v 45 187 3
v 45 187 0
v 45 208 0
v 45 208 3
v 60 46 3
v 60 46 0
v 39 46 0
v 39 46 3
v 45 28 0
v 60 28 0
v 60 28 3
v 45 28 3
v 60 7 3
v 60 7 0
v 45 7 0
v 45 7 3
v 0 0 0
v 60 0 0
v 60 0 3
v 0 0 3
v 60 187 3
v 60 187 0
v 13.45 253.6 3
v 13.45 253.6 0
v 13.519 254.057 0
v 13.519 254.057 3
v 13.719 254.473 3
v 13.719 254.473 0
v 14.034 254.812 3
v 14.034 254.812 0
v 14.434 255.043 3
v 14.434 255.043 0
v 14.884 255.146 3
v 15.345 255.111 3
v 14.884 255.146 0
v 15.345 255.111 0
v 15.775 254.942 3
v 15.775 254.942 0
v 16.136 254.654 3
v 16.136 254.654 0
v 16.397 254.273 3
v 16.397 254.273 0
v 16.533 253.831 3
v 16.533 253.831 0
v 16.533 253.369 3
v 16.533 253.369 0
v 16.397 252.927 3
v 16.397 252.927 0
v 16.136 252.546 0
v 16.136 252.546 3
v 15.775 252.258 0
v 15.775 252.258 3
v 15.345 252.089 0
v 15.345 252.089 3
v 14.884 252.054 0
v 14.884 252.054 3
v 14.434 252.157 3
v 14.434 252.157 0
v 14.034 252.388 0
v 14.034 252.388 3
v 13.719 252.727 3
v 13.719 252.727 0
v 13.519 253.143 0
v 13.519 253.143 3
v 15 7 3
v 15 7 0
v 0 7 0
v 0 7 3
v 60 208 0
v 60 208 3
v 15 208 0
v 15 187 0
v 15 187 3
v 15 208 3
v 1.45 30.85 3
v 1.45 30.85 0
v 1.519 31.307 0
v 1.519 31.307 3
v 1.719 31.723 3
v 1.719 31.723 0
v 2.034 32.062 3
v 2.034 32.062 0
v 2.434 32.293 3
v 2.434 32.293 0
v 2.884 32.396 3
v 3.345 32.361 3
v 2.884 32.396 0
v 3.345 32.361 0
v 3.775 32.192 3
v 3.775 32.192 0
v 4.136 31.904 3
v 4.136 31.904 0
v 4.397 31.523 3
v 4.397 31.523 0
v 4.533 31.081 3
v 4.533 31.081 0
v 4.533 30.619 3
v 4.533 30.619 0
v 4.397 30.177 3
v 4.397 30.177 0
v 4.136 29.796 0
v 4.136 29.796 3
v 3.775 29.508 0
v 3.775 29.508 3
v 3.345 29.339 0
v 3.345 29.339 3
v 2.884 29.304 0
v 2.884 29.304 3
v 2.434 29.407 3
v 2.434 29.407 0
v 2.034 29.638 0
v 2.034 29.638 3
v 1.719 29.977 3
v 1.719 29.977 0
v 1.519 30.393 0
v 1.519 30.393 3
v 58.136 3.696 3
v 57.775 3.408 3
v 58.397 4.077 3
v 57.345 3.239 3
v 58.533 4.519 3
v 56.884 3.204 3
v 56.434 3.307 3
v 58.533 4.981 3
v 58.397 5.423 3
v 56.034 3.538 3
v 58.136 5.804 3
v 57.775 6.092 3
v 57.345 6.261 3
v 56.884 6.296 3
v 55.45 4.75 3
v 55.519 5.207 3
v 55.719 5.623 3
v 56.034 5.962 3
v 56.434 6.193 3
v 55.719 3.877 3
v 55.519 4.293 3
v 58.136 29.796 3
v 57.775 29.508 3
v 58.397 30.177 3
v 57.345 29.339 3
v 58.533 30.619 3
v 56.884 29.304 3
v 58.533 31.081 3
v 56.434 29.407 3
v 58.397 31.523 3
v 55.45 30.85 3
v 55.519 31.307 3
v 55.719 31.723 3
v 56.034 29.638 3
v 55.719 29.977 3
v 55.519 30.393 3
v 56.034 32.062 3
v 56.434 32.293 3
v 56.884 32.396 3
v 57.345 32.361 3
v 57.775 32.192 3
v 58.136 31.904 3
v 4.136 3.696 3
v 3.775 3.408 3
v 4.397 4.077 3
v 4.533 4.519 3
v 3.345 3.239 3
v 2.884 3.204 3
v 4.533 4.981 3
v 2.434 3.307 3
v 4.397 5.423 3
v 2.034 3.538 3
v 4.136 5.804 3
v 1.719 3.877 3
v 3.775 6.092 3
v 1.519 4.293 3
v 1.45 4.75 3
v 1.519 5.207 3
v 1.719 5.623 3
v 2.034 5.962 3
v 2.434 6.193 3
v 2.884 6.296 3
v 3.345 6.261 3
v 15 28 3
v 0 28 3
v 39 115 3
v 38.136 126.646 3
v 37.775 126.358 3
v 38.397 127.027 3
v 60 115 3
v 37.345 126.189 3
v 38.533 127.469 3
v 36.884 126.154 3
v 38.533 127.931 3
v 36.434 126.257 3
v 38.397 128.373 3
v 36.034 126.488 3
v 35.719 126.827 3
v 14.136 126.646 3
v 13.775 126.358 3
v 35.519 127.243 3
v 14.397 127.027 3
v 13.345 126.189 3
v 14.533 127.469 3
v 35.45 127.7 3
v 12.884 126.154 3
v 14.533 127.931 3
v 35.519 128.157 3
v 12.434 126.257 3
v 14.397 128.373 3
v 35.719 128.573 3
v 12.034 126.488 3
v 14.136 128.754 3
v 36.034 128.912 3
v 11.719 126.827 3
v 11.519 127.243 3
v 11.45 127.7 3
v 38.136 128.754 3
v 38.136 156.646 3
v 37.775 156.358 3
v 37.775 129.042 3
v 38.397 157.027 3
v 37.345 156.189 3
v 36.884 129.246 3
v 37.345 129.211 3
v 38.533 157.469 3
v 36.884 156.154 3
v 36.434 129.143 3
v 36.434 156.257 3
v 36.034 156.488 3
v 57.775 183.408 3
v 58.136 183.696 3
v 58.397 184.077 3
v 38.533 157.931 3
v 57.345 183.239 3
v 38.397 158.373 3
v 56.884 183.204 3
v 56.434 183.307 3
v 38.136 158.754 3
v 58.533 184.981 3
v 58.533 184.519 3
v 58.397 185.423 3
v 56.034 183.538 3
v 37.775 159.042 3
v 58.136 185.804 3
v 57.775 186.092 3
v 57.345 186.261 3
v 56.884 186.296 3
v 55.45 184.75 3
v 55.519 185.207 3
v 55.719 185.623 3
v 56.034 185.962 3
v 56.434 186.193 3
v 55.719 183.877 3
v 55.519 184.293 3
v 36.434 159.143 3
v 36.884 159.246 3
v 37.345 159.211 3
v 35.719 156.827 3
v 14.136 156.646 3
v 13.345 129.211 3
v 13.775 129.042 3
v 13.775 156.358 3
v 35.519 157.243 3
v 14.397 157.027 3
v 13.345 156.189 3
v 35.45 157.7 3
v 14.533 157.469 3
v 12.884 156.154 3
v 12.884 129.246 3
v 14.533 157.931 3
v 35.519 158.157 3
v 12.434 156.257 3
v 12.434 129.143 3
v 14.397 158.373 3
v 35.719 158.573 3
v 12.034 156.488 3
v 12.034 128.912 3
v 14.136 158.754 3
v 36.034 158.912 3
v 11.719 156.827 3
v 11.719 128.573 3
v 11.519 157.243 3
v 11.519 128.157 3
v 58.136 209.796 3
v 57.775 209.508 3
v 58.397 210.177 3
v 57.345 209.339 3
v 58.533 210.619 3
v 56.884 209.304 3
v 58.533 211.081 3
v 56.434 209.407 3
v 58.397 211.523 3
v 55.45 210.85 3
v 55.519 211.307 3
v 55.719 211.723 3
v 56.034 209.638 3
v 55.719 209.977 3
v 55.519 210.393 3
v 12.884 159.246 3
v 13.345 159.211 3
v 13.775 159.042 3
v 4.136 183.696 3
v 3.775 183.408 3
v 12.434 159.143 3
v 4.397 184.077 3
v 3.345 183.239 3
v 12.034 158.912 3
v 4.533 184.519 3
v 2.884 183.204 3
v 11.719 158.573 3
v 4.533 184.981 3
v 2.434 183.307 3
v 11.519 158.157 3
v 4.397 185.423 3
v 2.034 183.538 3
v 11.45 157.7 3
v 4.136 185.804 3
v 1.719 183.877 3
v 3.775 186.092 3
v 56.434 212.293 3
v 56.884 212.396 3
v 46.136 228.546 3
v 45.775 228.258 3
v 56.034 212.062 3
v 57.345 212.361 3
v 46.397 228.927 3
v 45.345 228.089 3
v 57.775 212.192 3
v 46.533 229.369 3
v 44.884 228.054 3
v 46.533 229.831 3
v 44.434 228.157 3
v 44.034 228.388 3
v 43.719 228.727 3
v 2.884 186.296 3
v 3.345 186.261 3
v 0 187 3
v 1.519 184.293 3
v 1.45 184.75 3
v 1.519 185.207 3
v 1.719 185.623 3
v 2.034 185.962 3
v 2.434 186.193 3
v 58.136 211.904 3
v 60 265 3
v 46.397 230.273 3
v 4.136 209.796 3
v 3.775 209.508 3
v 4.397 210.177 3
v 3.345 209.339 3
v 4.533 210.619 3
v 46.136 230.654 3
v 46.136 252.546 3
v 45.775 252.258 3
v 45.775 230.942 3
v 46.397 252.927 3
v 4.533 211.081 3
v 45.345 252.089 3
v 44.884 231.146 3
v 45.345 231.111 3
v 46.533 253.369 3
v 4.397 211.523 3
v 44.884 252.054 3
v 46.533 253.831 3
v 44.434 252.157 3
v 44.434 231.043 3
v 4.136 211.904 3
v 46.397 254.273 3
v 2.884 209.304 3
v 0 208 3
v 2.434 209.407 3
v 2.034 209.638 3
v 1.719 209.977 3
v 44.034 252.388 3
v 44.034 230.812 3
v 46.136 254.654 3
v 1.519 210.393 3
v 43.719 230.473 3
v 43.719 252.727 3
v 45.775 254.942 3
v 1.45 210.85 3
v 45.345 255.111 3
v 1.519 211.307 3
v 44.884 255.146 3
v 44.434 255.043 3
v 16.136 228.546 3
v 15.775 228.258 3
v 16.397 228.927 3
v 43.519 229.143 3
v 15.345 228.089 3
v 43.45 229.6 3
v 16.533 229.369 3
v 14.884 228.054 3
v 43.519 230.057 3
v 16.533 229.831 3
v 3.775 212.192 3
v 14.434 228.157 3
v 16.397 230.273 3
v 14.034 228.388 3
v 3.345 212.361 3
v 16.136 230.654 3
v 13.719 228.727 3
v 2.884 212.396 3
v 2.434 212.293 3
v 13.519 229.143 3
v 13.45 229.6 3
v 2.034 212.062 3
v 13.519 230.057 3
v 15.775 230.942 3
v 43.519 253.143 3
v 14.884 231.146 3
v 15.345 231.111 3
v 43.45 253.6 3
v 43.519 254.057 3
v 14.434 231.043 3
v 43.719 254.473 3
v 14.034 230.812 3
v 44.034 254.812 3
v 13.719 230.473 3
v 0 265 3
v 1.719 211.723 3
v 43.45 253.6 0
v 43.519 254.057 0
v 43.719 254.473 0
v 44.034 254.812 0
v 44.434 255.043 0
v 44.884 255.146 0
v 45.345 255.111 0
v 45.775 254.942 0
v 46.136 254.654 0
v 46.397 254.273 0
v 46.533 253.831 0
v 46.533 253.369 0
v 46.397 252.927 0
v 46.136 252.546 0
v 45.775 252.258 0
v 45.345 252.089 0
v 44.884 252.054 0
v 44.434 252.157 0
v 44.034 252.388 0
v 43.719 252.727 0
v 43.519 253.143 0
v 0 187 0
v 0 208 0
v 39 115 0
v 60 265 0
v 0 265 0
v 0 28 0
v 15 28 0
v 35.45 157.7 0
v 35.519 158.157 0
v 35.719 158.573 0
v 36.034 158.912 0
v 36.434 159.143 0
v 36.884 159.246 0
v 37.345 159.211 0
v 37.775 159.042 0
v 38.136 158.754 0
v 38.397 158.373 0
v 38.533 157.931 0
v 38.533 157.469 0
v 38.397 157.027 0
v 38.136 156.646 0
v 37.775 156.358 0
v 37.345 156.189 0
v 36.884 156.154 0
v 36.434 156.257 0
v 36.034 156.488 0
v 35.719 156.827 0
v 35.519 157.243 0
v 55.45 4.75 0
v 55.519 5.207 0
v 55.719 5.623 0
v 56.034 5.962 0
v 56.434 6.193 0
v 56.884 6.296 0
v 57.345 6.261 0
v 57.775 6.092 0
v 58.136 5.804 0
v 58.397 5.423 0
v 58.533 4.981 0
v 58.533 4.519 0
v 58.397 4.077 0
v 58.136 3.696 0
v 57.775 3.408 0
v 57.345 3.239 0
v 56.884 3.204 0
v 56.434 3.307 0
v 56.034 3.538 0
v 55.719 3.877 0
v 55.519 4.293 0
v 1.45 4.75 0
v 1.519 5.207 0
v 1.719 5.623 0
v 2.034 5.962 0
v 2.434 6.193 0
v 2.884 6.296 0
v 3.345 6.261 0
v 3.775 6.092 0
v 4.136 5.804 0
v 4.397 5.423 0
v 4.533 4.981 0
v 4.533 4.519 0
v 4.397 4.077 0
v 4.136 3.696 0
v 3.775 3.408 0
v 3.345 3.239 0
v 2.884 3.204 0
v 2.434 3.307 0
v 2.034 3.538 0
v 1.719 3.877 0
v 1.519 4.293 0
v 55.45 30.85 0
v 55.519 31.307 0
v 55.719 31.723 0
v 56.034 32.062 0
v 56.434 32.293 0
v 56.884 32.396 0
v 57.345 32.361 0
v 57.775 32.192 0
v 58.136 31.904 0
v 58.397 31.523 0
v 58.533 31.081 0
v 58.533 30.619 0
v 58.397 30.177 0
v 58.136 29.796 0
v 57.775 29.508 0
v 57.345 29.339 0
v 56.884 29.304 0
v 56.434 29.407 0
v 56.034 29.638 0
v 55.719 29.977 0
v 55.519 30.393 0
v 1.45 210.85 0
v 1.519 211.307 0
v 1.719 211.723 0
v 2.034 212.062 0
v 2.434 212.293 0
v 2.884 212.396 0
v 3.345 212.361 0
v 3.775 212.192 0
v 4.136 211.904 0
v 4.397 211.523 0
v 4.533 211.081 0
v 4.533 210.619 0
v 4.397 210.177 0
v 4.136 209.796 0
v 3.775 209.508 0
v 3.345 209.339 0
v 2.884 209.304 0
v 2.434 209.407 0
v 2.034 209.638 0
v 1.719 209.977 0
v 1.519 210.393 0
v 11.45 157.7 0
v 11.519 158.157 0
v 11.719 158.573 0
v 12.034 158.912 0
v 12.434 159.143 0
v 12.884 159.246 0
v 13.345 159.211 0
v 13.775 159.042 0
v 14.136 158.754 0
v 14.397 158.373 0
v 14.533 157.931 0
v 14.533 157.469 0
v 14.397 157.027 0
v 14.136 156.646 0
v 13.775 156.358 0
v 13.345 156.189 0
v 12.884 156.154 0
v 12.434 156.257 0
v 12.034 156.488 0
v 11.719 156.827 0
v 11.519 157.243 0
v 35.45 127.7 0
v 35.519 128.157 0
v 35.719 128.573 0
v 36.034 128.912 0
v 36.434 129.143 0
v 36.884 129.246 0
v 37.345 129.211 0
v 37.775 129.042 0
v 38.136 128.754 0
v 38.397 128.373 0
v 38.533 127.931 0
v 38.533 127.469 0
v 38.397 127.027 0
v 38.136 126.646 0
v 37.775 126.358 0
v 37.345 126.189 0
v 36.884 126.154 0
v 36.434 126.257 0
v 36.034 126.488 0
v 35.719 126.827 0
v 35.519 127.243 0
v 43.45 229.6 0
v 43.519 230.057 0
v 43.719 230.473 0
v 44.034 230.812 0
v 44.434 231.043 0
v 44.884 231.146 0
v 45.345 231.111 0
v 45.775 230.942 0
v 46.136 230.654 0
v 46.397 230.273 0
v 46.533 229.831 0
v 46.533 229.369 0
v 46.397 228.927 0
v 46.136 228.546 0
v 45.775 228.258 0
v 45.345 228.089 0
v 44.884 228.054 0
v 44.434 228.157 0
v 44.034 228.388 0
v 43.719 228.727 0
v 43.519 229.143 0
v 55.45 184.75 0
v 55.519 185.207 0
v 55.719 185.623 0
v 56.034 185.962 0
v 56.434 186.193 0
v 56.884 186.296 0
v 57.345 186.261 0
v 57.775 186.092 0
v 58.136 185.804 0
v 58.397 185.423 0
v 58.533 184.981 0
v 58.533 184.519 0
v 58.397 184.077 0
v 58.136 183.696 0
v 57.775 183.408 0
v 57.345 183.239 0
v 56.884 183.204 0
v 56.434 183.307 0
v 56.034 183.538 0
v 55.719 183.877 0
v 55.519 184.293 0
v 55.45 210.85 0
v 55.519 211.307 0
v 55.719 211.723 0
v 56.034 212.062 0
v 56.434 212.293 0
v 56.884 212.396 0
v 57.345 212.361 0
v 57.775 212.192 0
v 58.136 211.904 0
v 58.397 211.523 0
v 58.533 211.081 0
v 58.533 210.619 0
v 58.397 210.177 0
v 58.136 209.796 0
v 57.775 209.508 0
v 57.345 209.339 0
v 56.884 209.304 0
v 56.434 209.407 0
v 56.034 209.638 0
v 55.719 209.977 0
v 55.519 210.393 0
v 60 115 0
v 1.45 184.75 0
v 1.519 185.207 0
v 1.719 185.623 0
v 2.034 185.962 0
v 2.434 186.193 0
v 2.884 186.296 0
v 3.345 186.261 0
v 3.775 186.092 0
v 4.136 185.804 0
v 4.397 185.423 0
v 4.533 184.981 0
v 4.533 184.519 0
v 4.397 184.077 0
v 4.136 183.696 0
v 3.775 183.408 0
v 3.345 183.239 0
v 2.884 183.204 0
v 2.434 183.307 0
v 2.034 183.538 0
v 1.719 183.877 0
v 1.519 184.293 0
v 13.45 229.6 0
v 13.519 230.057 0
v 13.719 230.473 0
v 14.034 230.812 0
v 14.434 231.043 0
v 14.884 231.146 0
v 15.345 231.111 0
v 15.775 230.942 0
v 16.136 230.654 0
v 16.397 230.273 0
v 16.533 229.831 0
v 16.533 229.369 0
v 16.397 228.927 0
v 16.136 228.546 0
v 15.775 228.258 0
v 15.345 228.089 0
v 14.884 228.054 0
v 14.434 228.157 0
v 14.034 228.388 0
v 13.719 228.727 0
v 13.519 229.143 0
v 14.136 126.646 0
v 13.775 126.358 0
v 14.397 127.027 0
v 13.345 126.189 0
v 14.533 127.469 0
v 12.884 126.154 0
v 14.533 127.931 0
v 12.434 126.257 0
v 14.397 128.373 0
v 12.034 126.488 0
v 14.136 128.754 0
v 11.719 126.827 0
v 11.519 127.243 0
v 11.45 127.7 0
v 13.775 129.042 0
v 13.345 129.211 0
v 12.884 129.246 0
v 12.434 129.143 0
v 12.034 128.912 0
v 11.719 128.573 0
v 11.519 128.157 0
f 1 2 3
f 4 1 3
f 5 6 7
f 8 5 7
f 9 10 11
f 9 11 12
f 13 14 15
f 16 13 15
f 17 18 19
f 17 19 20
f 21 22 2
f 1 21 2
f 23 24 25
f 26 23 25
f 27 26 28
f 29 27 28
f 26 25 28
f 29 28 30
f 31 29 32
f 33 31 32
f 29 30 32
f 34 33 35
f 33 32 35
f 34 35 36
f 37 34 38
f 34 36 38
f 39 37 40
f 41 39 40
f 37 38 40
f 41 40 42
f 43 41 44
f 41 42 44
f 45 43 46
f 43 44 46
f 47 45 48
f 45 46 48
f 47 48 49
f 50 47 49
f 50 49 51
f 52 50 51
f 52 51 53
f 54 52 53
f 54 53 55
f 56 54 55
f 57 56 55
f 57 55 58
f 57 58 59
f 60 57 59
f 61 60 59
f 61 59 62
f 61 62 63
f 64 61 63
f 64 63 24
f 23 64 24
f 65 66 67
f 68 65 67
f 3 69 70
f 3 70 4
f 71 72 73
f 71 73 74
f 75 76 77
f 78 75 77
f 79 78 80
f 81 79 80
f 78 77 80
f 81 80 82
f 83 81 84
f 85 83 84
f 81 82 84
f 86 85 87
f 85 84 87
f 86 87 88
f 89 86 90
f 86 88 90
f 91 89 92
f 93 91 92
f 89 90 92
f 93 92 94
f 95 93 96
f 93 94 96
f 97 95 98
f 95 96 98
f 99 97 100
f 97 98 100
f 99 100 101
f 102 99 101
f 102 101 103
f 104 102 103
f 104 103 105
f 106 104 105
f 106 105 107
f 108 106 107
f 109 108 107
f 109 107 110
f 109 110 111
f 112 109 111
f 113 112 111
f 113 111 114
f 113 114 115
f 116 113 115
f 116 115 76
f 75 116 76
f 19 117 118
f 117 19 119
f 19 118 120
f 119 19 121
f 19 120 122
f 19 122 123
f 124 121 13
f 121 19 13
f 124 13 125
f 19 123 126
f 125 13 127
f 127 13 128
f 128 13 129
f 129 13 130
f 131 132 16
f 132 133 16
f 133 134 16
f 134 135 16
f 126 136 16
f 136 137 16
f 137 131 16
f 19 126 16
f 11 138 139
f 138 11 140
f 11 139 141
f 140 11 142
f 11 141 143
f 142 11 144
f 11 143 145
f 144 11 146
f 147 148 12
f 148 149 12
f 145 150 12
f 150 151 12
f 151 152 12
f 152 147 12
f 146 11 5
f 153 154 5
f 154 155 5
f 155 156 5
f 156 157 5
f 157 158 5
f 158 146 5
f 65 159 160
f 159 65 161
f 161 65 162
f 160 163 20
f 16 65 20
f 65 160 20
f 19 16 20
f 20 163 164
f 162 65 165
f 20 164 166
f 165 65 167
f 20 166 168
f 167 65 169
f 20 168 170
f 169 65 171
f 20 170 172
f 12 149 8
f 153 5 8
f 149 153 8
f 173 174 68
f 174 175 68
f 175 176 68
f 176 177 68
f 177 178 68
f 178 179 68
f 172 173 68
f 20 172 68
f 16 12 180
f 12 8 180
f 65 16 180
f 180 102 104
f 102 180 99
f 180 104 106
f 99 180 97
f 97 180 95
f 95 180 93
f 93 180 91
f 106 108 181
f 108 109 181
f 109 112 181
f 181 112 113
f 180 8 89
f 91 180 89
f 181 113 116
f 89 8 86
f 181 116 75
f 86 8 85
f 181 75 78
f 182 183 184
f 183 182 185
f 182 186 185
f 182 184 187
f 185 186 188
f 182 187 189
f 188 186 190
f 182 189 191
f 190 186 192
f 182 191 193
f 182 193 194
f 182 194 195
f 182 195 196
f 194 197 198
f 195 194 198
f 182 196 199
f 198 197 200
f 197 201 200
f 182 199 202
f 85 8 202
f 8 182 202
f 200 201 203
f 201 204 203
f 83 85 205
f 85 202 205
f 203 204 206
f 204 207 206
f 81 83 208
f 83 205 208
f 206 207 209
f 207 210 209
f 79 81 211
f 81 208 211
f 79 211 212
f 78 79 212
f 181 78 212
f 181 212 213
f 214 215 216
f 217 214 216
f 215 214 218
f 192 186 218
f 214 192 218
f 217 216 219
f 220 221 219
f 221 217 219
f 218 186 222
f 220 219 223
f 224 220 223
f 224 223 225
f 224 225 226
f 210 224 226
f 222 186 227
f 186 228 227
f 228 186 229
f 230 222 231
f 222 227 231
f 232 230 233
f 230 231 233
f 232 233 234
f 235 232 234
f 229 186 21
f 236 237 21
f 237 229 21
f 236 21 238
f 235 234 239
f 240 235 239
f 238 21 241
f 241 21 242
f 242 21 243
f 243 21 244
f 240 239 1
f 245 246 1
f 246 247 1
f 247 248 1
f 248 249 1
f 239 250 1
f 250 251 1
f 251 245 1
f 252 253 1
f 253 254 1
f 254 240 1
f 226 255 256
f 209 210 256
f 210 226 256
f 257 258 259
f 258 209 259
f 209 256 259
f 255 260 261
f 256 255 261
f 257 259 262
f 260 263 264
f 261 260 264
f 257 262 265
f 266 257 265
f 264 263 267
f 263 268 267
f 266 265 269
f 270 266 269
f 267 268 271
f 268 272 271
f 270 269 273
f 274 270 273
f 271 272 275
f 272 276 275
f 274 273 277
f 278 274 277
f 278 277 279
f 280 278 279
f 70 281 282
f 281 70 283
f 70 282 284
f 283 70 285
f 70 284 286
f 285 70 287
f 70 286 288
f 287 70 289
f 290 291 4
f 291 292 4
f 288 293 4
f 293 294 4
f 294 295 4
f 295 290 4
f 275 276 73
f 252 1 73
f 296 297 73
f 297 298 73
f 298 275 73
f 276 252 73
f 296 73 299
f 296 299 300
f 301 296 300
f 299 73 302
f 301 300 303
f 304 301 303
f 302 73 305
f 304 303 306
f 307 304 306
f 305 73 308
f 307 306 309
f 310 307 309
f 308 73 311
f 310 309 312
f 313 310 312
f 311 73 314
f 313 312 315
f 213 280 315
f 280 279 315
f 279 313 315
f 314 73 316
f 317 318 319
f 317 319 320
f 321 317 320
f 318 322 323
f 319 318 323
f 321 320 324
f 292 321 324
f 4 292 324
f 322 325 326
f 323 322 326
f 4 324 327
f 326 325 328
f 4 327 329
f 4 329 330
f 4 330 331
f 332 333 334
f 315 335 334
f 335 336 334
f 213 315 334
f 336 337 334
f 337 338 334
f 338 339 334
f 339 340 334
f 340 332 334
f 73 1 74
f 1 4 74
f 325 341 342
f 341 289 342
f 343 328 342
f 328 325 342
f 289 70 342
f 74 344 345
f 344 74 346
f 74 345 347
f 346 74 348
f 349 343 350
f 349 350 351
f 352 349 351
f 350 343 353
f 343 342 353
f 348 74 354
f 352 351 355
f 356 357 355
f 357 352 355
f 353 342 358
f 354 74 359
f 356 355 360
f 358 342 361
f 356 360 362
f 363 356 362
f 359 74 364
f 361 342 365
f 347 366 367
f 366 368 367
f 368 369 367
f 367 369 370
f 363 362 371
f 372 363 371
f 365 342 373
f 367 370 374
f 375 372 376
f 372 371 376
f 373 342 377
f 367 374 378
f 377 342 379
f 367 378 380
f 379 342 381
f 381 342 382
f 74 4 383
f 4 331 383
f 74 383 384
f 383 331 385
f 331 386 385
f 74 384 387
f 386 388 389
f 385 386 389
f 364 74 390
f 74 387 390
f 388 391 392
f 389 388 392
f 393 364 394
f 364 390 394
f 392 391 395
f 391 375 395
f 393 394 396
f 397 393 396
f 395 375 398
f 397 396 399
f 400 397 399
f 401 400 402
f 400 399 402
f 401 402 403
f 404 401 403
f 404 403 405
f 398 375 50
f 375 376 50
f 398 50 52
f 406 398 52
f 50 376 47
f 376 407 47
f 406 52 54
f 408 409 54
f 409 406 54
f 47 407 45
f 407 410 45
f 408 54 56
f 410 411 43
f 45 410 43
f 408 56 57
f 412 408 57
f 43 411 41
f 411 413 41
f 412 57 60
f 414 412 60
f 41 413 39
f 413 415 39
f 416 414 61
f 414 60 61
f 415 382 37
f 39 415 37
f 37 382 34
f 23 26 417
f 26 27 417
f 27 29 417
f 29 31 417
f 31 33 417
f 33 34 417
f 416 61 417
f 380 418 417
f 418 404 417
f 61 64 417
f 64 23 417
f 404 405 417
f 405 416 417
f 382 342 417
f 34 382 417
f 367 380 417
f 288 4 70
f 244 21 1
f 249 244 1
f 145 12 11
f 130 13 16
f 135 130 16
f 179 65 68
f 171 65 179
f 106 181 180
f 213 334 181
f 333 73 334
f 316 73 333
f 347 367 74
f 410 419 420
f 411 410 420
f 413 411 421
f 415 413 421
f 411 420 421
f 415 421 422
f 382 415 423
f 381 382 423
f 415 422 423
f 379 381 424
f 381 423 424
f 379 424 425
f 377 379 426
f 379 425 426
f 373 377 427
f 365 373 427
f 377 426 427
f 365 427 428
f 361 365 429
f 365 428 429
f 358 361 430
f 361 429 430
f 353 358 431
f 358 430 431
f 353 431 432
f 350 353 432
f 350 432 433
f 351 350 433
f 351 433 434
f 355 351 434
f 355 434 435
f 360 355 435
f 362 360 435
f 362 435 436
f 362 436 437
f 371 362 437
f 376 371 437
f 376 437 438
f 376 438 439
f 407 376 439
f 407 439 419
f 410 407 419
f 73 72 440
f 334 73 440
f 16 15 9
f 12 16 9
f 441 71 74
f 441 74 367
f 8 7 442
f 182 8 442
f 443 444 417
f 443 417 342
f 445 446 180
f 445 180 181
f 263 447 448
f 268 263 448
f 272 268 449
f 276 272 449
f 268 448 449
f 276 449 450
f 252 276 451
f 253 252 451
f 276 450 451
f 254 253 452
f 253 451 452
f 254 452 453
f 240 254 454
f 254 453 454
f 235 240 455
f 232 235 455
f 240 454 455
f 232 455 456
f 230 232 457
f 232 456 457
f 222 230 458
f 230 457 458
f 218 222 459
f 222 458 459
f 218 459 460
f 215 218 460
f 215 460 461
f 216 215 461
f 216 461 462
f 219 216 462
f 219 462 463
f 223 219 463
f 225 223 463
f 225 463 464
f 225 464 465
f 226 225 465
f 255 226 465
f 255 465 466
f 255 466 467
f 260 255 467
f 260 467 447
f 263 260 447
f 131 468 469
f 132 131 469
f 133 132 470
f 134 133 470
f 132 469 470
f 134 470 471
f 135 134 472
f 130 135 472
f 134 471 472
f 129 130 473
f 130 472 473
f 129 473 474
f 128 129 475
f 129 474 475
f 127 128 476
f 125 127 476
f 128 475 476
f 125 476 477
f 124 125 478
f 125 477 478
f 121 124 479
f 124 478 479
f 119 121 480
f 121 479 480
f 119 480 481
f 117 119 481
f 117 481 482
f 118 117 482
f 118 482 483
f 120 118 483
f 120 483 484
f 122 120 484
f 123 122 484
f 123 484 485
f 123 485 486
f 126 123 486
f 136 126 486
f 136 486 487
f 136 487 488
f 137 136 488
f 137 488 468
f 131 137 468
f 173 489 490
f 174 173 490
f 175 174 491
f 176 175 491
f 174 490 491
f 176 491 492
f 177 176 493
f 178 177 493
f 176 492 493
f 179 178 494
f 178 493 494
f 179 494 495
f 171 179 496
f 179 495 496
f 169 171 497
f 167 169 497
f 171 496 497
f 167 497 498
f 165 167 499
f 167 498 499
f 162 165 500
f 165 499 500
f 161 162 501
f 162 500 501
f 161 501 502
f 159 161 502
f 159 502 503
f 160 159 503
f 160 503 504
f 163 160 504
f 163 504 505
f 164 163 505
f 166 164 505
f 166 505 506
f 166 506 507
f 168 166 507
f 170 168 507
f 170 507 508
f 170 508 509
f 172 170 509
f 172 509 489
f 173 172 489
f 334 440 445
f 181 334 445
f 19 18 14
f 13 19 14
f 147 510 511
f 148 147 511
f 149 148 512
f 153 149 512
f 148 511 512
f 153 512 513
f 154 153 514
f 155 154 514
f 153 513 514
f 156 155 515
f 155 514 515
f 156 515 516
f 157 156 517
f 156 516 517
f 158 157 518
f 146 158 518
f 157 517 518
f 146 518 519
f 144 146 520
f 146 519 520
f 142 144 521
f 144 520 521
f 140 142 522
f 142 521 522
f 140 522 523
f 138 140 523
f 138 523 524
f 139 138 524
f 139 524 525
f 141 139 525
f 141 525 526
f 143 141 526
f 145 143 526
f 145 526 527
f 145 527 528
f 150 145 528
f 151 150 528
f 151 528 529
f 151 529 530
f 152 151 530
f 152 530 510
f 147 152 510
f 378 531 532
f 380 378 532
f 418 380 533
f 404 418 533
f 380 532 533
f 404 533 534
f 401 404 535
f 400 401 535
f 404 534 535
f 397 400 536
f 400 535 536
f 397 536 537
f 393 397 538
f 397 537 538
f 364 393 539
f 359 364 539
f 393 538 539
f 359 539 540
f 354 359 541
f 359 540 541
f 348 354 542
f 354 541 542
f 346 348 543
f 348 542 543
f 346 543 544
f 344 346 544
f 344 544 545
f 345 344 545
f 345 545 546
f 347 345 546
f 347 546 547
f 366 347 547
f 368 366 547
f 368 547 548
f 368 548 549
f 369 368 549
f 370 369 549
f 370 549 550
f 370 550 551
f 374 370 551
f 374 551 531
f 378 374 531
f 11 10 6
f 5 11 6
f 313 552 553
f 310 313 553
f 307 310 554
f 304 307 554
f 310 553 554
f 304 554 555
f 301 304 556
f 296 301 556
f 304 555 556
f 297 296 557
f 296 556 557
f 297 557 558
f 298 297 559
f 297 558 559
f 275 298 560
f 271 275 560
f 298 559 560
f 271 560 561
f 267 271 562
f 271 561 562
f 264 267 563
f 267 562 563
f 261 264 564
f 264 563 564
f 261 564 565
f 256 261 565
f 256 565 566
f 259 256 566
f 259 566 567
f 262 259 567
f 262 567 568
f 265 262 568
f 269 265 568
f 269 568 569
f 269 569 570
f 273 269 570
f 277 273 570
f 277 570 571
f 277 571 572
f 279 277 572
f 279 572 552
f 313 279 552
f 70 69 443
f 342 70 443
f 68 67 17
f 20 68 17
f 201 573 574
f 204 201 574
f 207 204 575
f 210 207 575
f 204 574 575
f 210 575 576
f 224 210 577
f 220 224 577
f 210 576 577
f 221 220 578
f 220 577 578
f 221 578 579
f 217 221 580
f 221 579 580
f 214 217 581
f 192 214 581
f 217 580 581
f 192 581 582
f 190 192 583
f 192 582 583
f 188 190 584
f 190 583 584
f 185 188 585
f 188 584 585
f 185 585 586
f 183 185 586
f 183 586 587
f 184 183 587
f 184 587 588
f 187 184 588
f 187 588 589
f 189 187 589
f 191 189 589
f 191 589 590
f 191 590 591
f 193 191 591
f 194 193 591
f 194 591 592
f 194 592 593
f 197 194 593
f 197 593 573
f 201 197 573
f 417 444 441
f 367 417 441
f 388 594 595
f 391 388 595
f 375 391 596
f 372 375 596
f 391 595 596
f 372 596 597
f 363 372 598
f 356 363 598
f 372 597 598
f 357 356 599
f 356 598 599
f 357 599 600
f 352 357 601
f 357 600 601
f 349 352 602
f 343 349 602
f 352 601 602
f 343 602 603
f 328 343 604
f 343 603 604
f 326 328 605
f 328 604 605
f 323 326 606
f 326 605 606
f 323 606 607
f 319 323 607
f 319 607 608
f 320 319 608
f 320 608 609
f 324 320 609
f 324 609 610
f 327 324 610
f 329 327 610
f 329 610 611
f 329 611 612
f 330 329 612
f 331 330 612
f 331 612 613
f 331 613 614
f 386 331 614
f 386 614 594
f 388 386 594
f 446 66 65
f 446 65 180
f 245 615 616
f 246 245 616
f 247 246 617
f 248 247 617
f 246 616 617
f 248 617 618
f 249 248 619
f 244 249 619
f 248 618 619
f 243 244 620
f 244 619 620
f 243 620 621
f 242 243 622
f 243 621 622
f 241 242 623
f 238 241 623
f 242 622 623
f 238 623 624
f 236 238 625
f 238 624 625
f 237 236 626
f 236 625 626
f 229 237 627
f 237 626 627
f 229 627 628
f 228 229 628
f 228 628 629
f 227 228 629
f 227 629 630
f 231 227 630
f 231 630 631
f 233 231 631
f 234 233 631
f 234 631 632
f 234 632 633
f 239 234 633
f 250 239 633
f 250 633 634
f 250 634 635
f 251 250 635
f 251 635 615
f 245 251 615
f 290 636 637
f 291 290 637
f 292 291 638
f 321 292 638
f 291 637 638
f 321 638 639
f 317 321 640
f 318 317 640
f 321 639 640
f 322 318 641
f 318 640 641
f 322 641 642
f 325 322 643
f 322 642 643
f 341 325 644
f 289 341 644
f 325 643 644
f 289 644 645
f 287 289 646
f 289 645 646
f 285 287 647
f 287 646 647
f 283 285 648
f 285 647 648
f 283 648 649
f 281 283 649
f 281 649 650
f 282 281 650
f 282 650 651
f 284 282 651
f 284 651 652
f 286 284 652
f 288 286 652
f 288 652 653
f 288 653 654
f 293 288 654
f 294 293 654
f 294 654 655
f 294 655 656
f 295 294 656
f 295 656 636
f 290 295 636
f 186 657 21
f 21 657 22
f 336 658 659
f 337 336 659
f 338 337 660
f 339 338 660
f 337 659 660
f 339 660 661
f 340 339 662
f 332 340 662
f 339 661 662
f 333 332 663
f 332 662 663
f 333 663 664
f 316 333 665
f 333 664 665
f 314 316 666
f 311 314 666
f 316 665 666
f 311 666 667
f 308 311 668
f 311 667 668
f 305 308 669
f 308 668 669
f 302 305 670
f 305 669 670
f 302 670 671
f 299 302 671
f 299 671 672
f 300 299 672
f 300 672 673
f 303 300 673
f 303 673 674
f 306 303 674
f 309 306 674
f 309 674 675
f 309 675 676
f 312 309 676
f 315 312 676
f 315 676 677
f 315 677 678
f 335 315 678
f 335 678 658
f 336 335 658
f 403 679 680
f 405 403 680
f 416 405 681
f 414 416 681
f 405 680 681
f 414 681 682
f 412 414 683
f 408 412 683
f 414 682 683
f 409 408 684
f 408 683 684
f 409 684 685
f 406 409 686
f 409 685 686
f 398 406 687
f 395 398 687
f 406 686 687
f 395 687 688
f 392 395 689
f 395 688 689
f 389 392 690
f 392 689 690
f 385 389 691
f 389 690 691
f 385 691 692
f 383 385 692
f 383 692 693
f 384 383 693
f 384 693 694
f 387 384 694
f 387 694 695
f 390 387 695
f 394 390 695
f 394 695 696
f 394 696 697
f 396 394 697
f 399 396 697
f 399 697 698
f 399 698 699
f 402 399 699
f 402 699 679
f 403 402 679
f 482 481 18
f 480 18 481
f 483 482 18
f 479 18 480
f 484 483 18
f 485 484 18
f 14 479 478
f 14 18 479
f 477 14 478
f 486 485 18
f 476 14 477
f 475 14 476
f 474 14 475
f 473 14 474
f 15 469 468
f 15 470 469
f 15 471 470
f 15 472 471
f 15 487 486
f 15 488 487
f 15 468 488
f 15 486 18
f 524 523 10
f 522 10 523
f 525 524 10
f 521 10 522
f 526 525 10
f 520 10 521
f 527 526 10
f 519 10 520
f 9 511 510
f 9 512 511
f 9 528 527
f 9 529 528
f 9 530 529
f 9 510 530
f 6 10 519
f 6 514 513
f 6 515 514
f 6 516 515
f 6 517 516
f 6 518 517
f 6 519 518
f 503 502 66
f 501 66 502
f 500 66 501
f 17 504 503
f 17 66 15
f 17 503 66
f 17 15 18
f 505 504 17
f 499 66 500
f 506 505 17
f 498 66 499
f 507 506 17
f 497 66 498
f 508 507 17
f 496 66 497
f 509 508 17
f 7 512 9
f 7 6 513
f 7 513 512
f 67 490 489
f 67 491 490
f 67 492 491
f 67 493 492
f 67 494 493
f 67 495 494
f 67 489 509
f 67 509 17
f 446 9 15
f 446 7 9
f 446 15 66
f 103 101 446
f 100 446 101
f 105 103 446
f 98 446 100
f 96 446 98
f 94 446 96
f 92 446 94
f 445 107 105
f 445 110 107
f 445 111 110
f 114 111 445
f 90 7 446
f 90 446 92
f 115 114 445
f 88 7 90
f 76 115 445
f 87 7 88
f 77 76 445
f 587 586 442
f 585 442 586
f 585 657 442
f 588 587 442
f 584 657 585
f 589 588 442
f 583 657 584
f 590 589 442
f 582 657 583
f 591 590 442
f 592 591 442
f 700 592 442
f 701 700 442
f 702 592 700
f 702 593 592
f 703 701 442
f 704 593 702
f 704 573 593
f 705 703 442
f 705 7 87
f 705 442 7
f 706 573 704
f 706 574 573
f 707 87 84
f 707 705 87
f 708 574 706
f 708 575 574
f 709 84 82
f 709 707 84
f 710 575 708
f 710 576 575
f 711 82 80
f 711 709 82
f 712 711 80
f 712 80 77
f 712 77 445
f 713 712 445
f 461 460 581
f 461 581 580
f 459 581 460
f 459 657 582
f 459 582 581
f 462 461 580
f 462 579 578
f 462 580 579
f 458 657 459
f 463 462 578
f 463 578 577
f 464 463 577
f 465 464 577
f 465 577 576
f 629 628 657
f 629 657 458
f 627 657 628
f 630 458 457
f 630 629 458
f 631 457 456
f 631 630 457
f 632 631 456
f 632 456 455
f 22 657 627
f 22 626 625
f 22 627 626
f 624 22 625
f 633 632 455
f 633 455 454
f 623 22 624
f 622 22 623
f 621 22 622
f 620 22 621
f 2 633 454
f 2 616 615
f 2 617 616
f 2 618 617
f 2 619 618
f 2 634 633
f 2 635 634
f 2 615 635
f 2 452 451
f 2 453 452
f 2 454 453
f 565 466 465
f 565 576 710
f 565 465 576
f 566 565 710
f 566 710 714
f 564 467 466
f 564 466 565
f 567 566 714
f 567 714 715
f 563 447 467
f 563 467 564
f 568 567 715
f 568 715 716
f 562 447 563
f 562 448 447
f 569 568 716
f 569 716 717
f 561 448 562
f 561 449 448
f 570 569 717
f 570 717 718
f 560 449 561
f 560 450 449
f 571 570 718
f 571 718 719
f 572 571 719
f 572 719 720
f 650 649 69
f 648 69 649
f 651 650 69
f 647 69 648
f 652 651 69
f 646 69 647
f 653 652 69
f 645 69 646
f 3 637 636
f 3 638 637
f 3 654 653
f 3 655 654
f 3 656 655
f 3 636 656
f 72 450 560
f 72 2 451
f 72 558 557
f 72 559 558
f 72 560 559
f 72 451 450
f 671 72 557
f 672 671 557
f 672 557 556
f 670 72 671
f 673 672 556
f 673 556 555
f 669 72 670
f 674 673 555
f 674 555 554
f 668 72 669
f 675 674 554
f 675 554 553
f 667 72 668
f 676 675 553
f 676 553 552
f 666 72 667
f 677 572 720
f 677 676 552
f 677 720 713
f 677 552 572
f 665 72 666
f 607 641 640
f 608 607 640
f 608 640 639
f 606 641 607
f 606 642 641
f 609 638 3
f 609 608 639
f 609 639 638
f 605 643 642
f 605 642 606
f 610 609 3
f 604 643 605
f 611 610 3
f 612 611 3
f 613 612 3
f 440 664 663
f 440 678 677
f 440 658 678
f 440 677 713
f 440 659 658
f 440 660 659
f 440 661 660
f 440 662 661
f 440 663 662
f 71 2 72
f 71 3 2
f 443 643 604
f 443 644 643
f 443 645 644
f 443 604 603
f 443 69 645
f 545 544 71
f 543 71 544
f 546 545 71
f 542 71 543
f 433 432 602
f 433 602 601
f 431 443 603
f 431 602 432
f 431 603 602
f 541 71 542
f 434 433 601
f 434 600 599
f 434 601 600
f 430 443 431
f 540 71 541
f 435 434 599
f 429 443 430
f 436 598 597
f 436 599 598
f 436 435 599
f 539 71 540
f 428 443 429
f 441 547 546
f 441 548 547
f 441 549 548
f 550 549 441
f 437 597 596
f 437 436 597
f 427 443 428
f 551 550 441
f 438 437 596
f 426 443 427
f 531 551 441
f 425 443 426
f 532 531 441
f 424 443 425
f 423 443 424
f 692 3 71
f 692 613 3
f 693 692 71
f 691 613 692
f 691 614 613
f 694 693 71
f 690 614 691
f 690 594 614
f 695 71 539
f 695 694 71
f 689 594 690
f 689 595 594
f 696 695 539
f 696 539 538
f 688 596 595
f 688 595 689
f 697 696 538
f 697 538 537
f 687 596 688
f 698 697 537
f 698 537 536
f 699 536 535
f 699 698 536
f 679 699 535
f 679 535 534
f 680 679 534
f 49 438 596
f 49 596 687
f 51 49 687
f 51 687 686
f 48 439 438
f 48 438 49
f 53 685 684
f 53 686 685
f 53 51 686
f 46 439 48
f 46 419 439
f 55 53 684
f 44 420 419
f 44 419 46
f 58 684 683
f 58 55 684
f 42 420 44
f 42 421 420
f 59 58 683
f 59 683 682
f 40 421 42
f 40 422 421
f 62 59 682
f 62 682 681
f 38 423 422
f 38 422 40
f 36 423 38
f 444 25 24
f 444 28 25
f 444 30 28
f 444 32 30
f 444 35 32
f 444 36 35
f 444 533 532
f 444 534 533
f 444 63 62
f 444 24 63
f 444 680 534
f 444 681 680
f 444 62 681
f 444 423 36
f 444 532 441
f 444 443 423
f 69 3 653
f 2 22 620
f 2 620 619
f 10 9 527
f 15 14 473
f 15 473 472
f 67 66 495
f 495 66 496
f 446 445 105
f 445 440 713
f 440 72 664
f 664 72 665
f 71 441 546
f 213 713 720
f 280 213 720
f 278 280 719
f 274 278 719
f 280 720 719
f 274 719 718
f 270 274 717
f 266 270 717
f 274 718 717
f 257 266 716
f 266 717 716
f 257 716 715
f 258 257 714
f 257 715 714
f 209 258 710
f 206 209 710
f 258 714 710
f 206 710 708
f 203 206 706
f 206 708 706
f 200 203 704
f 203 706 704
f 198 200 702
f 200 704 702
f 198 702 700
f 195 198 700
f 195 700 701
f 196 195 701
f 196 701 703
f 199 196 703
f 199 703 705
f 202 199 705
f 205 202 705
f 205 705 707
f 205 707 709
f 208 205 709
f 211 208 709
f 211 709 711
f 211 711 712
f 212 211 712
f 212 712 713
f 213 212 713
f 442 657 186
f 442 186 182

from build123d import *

# Parameters (mm, degrees)
EXTRUDE_1_DEPTH     = 3
SKETCH_4_W          = 15
SKETCH_4_H          = 21
CUT_EXTRUDE_1_DEPTH = 3
SKETCH_5_R          = 1.55
CUT_EXTRUDE_2_DEPTH = 272.724124803
SKETCH_7_W          = 21
SKETCH_7_H          = 69
CUT_EXTRUDE_3_DEPTH = 272.724124803


with BuildPart() as part:
    # 草图1 → 凸台-拉伸1 (new body)
    with BuildSketch(Plane.XY):
        Polygon((0, 240), (0, 265), (60, 265), (60, 240), (60, 0), (0, 0), align=None)
    extrude(amount=EXTRUDE_1_DEPTH)

    # 草图4 → 切除-拉伸1 (cut)
    with BuildSketch(Plane(origin=(0, 0, 0), x_dir=(-1, 0, 0), z_dir=(0, 0, -1))):
        with Locations((-52.5, 17.5)):
            Rectangle(SKETCH_4_W, SKETCH_4_H)
        with Locations((-7.5, 17.5)):
            Rectangle(SKETCH_4_W, SKETCH_4_H)
        with Locations((-7.5, 197.5)):
            Rectangle(SKETCH_4_W, SKETCH_4_H)
        with Locations((-52.5, 197.5)):
            Rectangle(SKETCH_4_W, SKETCH_4_H)
    extrude(amount=-CUT_EXTRUDE_1_DEPTH, mode=Mode.SUBTRACT)

    # 草图5 → 切除-拉伸2 (cut, through all)
    with BuildSketch(Plane(origin=(0, 0, 0), x_dir=(-1, 0, 0), z_dir=(0, 0, -1))):
        with Locations((-45, 229.6)):
            Circle(SKETCH_5_R)
        with Locations((-45, 253.6)):
            Circle(SKETCH_5_R)
        with Locations((-15, 253.6)):
            Circle(SKETCH_5_R)
        with Locations((-15, 229.6)):
            Circle(SKETCH_5_R)
        with Locations((-57, 184.75)):
            Circle(SKETCH_5_R)
        with Locations((-3, 184.75)):
            Circle(SKETCH_5_R)
        with Locations((-3, 210.85)):
            Circle(SKETCH_5_R)
        with Locations((-57, 210.85)):
            Circle(SKETCH_5_R)
        with Locations((-13, 127.7)):
            Circle(SKETCH_5_R)
        with Locations((-37, 127.7)):
            Circle(SKETCH_5_R)
        with Locations((-37, 157.7)):
            Circle(SKETCH_5_R)
        with Locations((-13, 157.7)):
            Circle(SKETCH_5_R)
        with Locations((-57, 4.75)):
            Circle(SKETCH_5_R)
        with Locations((-3, 4.75)):
            Circle(SKETCH_5_R)
        with Locations((-3, 30.85)):
            Circle(SKETCH_5_R)
        with Locations((-57, 30.85)):
            Circle(SKETCH_5_R)
    extrude(amount=-CUT_EXTRUDE_2_DEPTH, mode=Mode.SUBTRACT)

    # 草图7 → 切除-拉伸3 (cut, through all)
    with BuildSketch(Plane(origin=(0, 0, 0), x_dir=(-1, 0, 0), z_dir=(0, 0, -1))):
        with Locations((-49.5, 80.5)):
            Rectangle(SKETCH_7_W, SKETCH_7_H)
    extrude(amount=-CUT_EXTRUDE_3_DEPTH, mode=Mode.SUBTRACT)


solid = part.part
